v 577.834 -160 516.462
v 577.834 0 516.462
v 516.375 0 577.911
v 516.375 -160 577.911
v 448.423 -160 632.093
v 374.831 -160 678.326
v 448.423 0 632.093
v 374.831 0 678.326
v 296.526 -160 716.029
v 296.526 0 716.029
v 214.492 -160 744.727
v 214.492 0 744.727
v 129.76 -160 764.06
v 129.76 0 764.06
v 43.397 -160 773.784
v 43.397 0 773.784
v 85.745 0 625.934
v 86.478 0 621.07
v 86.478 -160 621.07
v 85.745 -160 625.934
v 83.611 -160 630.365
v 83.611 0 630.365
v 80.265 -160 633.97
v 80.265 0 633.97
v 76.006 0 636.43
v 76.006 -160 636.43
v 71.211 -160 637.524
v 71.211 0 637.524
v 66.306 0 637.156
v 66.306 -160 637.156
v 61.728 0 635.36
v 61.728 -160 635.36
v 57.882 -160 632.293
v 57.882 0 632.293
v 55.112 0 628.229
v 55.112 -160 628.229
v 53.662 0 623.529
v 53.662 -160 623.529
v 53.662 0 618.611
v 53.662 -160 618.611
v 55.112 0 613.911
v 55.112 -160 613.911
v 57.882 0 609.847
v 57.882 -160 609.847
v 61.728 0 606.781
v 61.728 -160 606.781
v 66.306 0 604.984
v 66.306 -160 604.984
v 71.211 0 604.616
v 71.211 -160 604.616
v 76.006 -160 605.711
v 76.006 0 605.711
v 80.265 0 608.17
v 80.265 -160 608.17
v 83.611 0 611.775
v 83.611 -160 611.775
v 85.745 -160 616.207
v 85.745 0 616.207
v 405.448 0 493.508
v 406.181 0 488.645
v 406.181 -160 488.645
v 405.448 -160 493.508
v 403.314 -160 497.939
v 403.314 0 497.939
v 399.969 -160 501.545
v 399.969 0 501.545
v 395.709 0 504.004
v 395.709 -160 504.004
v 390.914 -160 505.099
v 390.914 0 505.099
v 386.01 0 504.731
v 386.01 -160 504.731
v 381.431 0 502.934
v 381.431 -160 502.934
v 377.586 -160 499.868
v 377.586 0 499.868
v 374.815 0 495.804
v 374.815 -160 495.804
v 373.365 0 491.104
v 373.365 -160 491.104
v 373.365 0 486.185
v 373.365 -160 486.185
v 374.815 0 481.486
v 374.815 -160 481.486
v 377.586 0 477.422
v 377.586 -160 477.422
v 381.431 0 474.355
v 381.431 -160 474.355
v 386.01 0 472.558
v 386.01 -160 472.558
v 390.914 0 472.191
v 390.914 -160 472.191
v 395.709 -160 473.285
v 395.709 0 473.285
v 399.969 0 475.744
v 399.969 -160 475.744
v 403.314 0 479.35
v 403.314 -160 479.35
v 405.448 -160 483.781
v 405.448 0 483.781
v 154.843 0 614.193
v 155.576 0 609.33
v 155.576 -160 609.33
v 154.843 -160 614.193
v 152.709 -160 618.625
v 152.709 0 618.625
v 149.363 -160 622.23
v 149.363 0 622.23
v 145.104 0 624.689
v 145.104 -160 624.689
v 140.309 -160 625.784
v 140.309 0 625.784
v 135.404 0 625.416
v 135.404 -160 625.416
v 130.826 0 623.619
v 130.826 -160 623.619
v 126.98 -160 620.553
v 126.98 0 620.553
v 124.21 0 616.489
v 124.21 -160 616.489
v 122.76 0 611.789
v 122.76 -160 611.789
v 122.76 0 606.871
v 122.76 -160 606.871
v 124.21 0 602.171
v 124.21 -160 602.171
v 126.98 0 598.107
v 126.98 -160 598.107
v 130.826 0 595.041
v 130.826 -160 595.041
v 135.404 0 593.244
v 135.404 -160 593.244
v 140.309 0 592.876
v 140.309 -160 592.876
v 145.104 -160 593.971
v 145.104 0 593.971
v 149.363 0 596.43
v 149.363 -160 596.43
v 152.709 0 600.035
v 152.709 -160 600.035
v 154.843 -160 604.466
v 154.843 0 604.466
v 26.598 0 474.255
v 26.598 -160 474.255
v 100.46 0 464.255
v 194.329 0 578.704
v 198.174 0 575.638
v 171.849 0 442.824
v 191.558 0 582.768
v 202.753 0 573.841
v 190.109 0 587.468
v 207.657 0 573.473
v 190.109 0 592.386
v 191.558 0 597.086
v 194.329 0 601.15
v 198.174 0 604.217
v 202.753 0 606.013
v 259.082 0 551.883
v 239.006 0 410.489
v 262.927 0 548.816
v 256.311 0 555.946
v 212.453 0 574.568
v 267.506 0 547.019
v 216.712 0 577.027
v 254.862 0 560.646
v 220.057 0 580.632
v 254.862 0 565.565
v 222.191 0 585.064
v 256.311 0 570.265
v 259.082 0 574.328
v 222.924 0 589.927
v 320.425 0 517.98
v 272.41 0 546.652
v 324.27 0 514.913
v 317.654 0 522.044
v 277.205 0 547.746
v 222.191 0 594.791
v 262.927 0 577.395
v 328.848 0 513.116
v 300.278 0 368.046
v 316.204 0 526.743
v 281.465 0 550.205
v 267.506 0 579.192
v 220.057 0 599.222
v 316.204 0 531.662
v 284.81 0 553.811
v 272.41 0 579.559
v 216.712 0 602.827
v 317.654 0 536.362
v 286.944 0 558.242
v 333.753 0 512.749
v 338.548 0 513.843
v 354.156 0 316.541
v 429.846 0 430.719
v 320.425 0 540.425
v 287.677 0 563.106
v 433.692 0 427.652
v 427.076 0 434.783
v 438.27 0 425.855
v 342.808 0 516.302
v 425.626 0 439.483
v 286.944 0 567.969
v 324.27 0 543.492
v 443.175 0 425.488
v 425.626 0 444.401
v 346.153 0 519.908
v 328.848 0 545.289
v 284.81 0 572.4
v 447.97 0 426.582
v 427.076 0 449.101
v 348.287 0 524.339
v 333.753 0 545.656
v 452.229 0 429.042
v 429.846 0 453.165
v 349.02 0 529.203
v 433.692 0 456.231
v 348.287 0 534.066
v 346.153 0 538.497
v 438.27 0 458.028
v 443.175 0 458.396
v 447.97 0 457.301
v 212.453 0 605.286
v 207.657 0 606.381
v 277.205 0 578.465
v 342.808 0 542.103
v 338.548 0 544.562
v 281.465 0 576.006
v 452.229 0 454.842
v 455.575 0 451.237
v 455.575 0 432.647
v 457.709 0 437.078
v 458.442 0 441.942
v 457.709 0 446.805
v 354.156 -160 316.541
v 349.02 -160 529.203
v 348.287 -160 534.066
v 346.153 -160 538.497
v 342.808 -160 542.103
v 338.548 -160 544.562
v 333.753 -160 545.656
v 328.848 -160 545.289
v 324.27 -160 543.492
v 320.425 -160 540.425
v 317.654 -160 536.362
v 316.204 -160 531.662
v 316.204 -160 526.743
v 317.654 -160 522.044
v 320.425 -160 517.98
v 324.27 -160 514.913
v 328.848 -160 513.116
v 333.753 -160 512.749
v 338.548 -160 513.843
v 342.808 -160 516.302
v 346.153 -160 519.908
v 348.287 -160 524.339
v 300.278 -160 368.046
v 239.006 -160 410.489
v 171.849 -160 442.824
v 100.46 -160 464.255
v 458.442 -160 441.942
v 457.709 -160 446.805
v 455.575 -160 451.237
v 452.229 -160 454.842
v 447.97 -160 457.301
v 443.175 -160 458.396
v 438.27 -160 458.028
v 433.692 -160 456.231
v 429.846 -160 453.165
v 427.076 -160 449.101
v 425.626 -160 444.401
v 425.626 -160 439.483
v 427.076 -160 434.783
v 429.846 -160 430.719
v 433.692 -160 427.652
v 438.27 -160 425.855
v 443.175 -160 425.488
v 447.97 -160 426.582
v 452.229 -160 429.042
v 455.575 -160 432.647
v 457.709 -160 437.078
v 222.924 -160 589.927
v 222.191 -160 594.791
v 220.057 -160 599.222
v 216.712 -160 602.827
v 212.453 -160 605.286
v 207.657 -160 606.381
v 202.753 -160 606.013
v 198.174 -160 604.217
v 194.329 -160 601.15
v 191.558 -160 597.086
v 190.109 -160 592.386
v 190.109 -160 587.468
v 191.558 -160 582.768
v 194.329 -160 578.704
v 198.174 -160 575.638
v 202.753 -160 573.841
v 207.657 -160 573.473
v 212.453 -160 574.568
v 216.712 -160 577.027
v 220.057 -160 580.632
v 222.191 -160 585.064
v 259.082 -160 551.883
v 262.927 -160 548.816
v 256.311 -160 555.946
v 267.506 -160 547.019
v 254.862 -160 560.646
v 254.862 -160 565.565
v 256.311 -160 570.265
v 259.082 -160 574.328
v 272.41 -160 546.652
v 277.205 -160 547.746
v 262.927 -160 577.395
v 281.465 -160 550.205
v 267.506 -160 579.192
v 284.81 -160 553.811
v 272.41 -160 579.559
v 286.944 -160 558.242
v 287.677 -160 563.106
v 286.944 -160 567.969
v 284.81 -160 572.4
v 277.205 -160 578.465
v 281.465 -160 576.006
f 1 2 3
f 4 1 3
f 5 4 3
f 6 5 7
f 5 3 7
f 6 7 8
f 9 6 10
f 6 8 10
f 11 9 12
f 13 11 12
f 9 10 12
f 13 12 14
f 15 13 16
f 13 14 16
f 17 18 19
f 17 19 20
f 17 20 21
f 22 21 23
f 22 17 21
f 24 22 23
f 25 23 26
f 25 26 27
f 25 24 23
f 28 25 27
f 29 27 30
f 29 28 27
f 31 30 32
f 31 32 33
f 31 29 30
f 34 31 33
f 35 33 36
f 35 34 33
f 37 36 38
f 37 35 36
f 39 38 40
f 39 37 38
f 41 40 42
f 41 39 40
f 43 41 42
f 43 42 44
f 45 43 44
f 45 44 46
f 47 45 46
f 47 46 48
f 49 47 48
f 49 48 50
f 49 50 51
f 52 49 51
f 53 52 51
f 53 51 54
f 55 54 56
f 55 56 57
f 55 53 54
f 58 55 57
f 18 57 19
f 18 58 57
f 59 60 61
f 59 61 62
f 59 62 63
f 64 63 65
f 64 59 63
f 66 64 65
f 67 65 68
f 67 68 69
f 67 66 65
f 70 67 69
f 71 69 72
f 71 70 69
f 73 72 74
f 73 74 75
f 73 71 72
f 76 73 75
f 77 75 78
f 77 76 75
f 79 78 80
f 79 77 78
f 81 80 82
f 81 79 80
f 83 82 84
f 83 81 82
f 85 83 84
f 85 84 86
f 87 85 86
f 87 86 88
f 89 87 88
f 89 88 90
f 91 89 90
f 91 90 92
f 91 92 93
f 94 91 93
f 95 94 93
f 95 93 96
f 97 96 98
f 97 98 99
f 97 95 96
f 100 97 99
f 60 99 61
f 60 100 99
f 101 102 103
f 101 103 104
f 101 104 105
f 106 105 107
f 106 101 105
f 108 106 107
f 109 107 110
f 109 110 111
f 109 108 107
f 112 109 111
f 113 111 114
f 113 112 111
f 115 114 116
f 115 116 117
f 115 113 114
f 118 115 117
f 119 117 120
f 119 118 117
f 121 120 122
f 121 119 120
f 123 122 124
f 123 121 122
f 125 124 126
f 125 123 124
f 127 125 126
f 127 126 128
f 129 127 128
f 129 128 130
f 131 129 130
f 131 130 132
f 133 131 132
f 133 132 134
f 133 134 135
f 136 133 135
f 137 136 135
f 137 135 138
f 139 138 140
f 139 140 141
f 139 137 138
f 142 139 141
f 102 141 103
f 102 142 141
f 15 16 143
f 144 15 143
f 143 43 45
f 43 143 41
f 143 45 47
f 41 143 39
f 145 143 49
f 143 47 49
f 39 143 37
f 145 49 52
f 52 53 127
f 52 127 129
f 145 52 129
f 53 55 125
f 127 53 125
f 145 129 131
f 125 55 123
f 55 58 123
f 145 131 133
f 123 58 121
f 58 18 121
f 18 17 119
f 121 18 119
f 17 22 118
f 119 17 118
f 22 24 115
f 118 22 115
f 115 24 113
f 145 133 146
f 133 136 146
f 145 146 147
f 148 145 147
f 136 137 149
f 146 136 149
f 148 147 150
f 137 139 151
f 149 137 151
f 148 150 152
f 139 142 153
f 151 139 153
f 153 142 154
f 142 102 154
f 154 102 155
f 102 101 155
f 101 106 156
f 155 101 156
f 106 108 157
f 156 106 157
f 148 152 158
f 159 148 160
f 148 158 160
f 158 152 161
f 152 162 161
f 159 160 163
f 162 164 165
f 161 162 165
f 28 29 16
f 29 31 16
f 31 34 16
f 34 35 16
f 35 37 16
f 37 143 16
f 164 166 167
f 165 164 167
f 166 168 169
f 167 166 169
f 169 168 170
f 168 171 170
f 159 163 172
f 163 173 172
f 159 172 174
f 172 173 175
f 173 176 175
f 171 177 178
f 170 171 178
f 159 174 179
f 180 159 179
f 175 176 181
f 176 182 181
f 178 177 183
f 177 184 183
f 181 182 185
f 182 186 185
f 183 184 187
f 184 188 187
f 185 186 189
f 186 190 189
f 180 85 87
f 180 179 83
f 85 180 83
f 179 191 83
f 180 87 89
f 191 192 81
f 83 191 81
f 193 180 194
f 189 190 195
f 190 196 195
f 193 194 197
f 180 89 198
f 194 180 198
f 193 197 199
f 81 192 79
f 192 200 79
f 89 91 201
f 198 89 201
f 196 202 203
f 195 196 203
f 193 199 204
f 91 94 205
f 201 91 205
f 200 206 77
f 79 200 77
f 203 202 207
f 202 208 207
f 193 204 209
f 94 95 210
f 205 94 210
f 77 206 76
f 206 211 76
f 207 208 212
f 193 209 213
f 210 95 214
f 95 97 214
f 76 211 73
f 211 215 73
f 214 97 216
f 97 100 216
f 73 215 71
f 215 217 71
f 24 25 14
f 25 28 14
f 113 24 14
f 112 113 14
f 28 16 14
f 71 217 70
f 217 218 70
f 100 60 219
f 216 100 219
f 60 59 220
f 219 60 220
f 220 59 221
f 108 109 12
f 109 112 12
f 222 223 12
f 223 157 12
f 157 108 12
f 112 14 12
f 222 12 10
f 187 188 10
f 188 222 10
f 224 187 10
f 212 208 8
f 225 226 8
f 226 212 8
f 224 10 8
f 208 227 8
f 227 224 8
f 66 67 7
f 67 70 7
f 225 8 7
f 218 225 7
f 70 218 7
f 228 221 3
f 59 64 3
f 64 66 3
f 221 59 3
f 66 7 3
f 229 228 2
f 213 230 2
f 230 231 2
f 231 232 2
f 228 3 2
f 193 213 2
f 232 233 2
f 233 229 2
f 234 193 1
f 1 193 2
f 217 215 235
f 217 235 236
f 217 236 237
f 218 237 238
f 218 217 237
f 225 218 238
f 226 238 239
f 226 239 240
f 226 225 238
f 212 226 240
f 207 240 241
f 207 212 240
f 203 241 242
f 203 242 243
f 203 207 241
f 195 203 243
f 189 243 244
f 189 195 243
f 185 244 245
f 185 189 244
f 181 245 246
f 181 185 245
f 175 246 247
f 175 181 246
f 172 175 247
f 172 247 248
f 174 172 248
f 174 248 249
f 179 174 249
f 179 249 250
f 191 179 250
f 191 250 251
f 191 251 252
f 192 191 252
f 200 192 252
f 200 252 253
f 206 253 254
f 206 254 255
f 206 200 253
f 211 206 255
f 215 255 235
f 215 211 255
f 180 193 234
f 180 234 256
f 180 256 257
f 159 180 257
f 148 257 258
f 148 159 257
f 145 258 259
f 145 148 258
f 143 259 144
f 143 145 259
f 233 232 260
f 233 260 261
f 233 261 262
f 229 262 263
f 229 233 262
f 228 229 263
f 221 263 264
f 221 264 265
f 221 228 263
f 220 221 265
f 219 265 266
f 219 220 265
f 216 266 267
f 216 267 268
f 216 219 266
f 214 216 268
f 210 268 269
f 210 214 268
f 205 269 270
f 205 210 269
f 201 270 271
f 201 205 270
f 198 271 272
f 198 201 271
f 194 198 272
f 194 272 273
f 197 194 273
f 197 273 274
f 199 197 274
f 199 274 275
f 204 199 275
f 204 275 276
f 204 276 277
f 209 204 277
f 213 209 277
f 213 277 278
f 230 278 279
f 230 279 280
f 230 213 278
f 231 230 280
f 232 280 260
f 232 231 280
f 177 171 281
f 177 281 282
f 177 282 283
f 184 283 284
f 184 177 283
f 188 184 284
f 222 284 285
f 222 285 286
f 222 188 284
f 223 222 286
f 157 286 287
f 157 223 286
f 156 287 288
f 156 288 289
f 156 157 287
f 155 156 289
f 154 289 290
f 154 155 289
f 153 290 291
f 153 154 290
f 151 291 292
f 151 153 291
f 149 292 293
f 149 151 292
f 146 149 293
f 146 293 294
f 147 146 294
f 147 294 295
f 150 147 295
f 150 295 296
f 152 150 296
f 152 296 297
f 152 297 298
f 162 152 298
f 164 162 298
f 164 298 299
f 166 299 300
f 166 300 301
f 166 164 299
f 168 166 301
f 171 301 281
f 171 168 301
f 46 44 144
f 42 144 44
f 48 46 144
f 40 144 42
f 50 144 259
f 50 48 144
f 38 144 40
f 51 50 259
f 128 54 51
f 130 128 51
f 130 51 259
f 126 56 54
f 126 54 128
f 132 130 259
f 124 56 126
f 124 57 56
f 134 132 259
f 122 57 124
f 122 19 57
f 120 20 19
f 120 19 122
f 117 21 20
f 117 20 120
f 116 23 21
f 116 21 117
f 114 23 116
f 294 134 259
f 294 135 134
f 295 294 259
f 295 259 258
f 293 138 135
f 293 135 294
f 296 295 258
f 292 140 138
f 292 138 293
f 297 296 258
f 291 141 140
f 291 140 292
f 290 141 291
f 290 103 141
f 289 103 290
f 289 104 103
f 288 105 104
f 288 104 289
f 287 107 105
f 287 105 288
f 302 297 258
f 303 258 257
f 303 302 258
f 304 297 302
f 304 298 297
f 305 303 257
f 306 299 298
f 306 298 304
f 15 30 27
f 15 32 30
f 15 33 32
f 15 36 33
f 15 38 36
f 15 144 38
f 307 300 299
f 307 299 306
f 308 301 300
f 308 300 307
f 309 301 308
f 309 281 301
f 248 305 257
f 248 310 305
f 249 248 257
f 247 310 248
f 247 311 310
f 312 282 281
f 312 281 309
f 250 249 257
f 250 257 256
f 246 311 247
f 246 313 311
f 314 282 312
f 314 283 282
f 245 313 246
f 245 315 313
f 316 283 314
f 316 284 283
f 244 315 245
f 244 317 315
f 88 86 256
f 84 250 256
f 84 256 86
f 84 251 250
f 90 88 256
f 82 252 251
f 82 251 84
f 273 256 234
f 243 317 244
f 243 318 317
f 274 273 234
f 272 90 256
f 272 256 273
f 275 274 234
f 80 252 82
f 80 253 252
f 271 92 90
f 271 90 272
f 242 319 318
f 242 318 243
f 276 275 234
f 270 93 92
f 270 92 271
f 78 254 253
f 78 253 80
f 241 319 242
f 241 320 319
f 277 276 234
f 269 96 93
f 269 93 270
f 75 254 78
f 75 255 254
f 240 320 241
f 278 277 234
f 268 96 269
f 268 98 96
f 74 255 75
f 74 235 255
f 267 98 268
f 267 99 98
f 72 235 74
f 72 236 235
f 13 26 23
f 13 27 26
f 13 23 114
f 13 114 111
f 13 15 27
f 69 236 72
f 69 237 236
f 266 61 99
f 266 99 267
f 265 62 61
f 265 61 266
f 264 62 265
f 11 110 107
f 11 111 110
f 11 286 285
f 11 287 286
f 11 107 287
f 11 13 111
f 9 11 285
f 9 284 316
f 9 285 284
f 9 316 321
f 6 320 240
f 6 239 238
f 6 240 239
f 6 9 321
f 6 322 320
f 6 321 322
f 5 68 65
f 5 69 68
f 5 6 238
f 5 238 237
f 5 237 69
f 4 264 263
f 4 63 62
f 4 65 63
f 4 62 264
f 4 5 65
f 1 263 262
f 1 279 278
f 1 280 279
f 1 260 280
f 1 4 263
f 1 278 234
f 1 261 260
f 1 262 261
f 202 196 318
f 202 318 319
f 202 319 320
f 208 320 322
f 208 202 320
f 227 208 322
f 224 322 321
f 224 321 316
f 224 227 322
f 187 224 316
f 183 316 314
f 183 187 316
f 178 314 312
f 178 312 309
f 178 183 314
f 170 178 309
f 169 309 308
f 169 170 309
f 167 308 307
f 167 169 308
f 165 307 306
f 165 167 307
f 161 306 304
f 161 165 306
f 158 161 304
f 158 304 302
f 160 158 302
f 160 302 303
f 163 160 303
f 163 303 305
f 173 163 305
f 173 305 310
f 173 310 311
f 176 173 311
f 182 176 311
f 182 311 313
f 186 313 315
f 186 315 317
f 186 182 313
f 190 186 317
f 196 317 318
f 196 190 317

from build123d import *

# Parameters (mm, degrees)
F0_R     = 775
F0_R_2   = 16.5
F0_R_3   = 475
F1_DEPTH = 160
F3_DEPTH = 160


with BuildPart() as f1:
    # F0 (on Front) → F1 (new body)
    with BuildSketch(Plane.XZ):
        Circle(F0_R)
        with Locations((-389.681126, -488.644677)):
            Circle(F0_R_2, mode=Mode.SUBTRACT)
        with Locations((-488.644677, -389.681126)):
            Circle(F0_R_2, mode=Mode.SUBTRACT)
        with Locations((-441.941738, -441.941738)):
            Circle(F0_R_2, mode=Mode.SUBTRACT)
        with Locations((-206.424414, -589.927081)):
            Circle(F0_R_2, mode=Mode.SUBTRACT)
        with Locations((-139.075584, -609.329945)):
            Circle(F0_R_2, mode=Mode.SUBTRACT)
        with Locations((-69.977798, -621.070131)):
            Circle(F0_R_2, mode=Mode.SUBTRACT)
        with Locations((-332.520048, -529.202625)):
            Circle(F0_R_2, mode=Mode.SUBTRACT)
        with Locations((-271.177337, -563.105542)):
            Circle(F0_R_2, mode=Mode.SUBTRACT)
        with Locations((-589.927081, -206.424414)):
            Circle(F0_R_2, mode=Mode.SUBTRACT)
        with Locations((-529.202625, -332.520048)):
            Circle(F0_R_2, mode=Mode.SUBTRACT)
        with Locations((-563.105542, -271.177337)):
            Circle(F0_R_2, mode=Mode.SUBTRACT)
        with Locations((-609.329945, -139.075584)):
            Circle(F0_R_2, mode=Mode.SUBTRACT)
        with Locations((-621.070131, -69.977798)):
            Circle(F0_R_2, mode=Mode.SUBTRACT)
        with Locations((0, -625)):
            Circle(F0_R_2, mode=Mode.SUBTRACT)
        with Locations((69.977798, -621.070131)):
            Circle(F0_R_2, mode=Mode.SUBTRACT)
        with Locations((139.075584, -609.329945)):
            Circle(F0_R_2, mode=Mode.SUBTRACT)
        with Locations((206.424414, -589.927081)):
            Circle(F0_R_2, mode=Mode.SUBTRACT)
        with Locations((271.177337, -563.105542)):
            Circle(F0_R_2, mode=Mode.SUBTRACT)
        with Locations((332.520048, -529.202625)):
            Circle(F0_R_2, mode=Mode.SUBTRACT)
        with Locations((389.681126, -488.644677)):
            Circle(F0_R_2, mode=Mode.SUBTRACT)
        with Locations((441.941738, -441.941738)):
            Circle(F0_R_2, mode=Mode.SUBTRACT)
        with Locations((488.644677, -389.681126)):
            Circle(F0_R_2, mode=Mode.SUBTRACT)
        with Locations((529.202625, -332.520048)):
            Circle(F0_R_2, mode=Mode.SUBTRACT)
        with Locations((563.105542, -271.177337)):
            Circle(F0_R_2, mode=Mode.SUBTRACT)
        with Locations((589.927081, -206.424414)):
            Circle(F0_R_2, mode=Mode.SUBTRACT)
        with Locations((609.329945, -139.075584)):
            Circle(F0_R_2, mode=Mode.SUBTRACT)
        with Locations((621.070131, -69.977798)):
            Circle(F0_R_2, mode=Mode.SUBTRACT)
        with Locations((-625, 0)):
            Circle(F0_R_2, mode=Mode.SUBTRACT)
        with Locations((-621.070131, 69.977798)):
            Circle(F0_R_2, mode=Mode.SUBTRACT)
        with Locations((-609.329945, 139.075584)):
            Circle(F0_R_2, mode=Mode.SUBTRACT)
        with Locations((-589.927081, 206.424414)):
            Circle(F0_R_2, mode=Mode.SUBTRACT)
        with Locations((-563.105542, 271.177337)):
            Circle(F0_R_2, mode=Mode.SUBTRACT)
        with Locations((-529.202625, 332.520048)):
            Circle(F0_R_2, mode=Mode.SUBTRACT)
        with Locations((-488.644677, 389.681126)):
            Circle(F0_R_2, mode=Mode.SUBTRACT)
        with Locations((-441.941738, 441.941738)):
            Circle(F0_R_2, mode=Mode.SUBTRACT)
        with Locations((-389.681126, 488.644677)):
            Circle(F0_R_2, mode=Mode.SUBTRACT)
        with Locations((-332.520048, 529.202625)):
            Circle(F0_R_2, mode=Mode.SUBTRACT)
        with Locations((-271.177337, 563.105542)):
            Circle(F0_R_2, mode=Mode.SUBTRACT)
        with Locations((-206.424414, 589.927081)):
            Circle(F0_R_2, mode=Mode.SUBTRACT)
        with Locations((-139.075584, 609.329945)):
            Circle(F0_R_2, mode=Mode.SUBTRACT)
        with Locations((-69.977798, 621.070131)):
            Circle(F0_R_2, mode=Mode.SUBTRACT)
        Circle(F0_R_3, mode=Mode.SUBTRACT)
        with Locations((625, 0)):
            Circle(F0_R_2, mode=Mode.SUBTRACT)
        with Locations((621.070131, 69.977798)):
            Circle(F0_R_2, mode=Mode.SUBTRACT)
        with Locations((609.329945, 139.075584)):
            Circle(F0_R_2, mode=Mode.SUBTRACT)
        with Locations((563.105542, 271.177337)):
            Circle(F0_R_2, mode=Mode.SUBTRACT)
        with Locations((529.202625, 332.520048)):
            Circle(F0_R_2, mode=Mode.SUBTRACT)
        with Locations((589.927081, 206.424414)):
            Circle(F0_R_2, mode=Mode.SUBTRACT)
        with Locations((271.177337, 563.105542)):
            Circle(F0_R_2, mode=Mode.SUBTRACT)
        with Locations((332.520048, 529.202625)):
            Circle(F0_R_2, mode=Mode.SUBTRACT)
        with Locations((0, 625)):
            Circle(F0_R_2, mode=Mode.SUBTRACT)
        with Locations((69.977798, 621.070131)):
            Circle(F0_R_2, mode=Mode.SUBTRACT)
        with Locations((139.075584, 609.329945)):
            Circle(F0_R_2, mode=Mode.SUBTRACT)
        with Locations((206.424414, 589.927081)):
            Circle(F0_R_2, mode=Mode.SUBTRACT)
        with Locations((441.941738, 441.941738)):
            Circle(F0_R_2, mode=Mode.SUBTRACT)
        with Locations((488.644677, 389.681126)):
            Circle(F0_R_2, mode=Mode.SUBTRACT)
        with Locations((389.681126, 488.644677)):
            Circle(F0_R_2, mode=Mode.SUBTRACT)
    extrude(amount=F1_DEPTH)


with BuildPart() as f3:
    # F2 (on Front) → F3 (new body)
    with BuildSketch(Plane.XZ):
        Polygon((78.170491, 1393.816872), (0, 0), (1136.468839, 1015.763554), align=None)
    extrude(amount=F3_DEPTH)


with BuildPart() as f1_1:
    add(f1.part)

    # F4: intersect F3
    add(f3.part, mode=Mode.INTERSECT)


solid = f1_1.part
